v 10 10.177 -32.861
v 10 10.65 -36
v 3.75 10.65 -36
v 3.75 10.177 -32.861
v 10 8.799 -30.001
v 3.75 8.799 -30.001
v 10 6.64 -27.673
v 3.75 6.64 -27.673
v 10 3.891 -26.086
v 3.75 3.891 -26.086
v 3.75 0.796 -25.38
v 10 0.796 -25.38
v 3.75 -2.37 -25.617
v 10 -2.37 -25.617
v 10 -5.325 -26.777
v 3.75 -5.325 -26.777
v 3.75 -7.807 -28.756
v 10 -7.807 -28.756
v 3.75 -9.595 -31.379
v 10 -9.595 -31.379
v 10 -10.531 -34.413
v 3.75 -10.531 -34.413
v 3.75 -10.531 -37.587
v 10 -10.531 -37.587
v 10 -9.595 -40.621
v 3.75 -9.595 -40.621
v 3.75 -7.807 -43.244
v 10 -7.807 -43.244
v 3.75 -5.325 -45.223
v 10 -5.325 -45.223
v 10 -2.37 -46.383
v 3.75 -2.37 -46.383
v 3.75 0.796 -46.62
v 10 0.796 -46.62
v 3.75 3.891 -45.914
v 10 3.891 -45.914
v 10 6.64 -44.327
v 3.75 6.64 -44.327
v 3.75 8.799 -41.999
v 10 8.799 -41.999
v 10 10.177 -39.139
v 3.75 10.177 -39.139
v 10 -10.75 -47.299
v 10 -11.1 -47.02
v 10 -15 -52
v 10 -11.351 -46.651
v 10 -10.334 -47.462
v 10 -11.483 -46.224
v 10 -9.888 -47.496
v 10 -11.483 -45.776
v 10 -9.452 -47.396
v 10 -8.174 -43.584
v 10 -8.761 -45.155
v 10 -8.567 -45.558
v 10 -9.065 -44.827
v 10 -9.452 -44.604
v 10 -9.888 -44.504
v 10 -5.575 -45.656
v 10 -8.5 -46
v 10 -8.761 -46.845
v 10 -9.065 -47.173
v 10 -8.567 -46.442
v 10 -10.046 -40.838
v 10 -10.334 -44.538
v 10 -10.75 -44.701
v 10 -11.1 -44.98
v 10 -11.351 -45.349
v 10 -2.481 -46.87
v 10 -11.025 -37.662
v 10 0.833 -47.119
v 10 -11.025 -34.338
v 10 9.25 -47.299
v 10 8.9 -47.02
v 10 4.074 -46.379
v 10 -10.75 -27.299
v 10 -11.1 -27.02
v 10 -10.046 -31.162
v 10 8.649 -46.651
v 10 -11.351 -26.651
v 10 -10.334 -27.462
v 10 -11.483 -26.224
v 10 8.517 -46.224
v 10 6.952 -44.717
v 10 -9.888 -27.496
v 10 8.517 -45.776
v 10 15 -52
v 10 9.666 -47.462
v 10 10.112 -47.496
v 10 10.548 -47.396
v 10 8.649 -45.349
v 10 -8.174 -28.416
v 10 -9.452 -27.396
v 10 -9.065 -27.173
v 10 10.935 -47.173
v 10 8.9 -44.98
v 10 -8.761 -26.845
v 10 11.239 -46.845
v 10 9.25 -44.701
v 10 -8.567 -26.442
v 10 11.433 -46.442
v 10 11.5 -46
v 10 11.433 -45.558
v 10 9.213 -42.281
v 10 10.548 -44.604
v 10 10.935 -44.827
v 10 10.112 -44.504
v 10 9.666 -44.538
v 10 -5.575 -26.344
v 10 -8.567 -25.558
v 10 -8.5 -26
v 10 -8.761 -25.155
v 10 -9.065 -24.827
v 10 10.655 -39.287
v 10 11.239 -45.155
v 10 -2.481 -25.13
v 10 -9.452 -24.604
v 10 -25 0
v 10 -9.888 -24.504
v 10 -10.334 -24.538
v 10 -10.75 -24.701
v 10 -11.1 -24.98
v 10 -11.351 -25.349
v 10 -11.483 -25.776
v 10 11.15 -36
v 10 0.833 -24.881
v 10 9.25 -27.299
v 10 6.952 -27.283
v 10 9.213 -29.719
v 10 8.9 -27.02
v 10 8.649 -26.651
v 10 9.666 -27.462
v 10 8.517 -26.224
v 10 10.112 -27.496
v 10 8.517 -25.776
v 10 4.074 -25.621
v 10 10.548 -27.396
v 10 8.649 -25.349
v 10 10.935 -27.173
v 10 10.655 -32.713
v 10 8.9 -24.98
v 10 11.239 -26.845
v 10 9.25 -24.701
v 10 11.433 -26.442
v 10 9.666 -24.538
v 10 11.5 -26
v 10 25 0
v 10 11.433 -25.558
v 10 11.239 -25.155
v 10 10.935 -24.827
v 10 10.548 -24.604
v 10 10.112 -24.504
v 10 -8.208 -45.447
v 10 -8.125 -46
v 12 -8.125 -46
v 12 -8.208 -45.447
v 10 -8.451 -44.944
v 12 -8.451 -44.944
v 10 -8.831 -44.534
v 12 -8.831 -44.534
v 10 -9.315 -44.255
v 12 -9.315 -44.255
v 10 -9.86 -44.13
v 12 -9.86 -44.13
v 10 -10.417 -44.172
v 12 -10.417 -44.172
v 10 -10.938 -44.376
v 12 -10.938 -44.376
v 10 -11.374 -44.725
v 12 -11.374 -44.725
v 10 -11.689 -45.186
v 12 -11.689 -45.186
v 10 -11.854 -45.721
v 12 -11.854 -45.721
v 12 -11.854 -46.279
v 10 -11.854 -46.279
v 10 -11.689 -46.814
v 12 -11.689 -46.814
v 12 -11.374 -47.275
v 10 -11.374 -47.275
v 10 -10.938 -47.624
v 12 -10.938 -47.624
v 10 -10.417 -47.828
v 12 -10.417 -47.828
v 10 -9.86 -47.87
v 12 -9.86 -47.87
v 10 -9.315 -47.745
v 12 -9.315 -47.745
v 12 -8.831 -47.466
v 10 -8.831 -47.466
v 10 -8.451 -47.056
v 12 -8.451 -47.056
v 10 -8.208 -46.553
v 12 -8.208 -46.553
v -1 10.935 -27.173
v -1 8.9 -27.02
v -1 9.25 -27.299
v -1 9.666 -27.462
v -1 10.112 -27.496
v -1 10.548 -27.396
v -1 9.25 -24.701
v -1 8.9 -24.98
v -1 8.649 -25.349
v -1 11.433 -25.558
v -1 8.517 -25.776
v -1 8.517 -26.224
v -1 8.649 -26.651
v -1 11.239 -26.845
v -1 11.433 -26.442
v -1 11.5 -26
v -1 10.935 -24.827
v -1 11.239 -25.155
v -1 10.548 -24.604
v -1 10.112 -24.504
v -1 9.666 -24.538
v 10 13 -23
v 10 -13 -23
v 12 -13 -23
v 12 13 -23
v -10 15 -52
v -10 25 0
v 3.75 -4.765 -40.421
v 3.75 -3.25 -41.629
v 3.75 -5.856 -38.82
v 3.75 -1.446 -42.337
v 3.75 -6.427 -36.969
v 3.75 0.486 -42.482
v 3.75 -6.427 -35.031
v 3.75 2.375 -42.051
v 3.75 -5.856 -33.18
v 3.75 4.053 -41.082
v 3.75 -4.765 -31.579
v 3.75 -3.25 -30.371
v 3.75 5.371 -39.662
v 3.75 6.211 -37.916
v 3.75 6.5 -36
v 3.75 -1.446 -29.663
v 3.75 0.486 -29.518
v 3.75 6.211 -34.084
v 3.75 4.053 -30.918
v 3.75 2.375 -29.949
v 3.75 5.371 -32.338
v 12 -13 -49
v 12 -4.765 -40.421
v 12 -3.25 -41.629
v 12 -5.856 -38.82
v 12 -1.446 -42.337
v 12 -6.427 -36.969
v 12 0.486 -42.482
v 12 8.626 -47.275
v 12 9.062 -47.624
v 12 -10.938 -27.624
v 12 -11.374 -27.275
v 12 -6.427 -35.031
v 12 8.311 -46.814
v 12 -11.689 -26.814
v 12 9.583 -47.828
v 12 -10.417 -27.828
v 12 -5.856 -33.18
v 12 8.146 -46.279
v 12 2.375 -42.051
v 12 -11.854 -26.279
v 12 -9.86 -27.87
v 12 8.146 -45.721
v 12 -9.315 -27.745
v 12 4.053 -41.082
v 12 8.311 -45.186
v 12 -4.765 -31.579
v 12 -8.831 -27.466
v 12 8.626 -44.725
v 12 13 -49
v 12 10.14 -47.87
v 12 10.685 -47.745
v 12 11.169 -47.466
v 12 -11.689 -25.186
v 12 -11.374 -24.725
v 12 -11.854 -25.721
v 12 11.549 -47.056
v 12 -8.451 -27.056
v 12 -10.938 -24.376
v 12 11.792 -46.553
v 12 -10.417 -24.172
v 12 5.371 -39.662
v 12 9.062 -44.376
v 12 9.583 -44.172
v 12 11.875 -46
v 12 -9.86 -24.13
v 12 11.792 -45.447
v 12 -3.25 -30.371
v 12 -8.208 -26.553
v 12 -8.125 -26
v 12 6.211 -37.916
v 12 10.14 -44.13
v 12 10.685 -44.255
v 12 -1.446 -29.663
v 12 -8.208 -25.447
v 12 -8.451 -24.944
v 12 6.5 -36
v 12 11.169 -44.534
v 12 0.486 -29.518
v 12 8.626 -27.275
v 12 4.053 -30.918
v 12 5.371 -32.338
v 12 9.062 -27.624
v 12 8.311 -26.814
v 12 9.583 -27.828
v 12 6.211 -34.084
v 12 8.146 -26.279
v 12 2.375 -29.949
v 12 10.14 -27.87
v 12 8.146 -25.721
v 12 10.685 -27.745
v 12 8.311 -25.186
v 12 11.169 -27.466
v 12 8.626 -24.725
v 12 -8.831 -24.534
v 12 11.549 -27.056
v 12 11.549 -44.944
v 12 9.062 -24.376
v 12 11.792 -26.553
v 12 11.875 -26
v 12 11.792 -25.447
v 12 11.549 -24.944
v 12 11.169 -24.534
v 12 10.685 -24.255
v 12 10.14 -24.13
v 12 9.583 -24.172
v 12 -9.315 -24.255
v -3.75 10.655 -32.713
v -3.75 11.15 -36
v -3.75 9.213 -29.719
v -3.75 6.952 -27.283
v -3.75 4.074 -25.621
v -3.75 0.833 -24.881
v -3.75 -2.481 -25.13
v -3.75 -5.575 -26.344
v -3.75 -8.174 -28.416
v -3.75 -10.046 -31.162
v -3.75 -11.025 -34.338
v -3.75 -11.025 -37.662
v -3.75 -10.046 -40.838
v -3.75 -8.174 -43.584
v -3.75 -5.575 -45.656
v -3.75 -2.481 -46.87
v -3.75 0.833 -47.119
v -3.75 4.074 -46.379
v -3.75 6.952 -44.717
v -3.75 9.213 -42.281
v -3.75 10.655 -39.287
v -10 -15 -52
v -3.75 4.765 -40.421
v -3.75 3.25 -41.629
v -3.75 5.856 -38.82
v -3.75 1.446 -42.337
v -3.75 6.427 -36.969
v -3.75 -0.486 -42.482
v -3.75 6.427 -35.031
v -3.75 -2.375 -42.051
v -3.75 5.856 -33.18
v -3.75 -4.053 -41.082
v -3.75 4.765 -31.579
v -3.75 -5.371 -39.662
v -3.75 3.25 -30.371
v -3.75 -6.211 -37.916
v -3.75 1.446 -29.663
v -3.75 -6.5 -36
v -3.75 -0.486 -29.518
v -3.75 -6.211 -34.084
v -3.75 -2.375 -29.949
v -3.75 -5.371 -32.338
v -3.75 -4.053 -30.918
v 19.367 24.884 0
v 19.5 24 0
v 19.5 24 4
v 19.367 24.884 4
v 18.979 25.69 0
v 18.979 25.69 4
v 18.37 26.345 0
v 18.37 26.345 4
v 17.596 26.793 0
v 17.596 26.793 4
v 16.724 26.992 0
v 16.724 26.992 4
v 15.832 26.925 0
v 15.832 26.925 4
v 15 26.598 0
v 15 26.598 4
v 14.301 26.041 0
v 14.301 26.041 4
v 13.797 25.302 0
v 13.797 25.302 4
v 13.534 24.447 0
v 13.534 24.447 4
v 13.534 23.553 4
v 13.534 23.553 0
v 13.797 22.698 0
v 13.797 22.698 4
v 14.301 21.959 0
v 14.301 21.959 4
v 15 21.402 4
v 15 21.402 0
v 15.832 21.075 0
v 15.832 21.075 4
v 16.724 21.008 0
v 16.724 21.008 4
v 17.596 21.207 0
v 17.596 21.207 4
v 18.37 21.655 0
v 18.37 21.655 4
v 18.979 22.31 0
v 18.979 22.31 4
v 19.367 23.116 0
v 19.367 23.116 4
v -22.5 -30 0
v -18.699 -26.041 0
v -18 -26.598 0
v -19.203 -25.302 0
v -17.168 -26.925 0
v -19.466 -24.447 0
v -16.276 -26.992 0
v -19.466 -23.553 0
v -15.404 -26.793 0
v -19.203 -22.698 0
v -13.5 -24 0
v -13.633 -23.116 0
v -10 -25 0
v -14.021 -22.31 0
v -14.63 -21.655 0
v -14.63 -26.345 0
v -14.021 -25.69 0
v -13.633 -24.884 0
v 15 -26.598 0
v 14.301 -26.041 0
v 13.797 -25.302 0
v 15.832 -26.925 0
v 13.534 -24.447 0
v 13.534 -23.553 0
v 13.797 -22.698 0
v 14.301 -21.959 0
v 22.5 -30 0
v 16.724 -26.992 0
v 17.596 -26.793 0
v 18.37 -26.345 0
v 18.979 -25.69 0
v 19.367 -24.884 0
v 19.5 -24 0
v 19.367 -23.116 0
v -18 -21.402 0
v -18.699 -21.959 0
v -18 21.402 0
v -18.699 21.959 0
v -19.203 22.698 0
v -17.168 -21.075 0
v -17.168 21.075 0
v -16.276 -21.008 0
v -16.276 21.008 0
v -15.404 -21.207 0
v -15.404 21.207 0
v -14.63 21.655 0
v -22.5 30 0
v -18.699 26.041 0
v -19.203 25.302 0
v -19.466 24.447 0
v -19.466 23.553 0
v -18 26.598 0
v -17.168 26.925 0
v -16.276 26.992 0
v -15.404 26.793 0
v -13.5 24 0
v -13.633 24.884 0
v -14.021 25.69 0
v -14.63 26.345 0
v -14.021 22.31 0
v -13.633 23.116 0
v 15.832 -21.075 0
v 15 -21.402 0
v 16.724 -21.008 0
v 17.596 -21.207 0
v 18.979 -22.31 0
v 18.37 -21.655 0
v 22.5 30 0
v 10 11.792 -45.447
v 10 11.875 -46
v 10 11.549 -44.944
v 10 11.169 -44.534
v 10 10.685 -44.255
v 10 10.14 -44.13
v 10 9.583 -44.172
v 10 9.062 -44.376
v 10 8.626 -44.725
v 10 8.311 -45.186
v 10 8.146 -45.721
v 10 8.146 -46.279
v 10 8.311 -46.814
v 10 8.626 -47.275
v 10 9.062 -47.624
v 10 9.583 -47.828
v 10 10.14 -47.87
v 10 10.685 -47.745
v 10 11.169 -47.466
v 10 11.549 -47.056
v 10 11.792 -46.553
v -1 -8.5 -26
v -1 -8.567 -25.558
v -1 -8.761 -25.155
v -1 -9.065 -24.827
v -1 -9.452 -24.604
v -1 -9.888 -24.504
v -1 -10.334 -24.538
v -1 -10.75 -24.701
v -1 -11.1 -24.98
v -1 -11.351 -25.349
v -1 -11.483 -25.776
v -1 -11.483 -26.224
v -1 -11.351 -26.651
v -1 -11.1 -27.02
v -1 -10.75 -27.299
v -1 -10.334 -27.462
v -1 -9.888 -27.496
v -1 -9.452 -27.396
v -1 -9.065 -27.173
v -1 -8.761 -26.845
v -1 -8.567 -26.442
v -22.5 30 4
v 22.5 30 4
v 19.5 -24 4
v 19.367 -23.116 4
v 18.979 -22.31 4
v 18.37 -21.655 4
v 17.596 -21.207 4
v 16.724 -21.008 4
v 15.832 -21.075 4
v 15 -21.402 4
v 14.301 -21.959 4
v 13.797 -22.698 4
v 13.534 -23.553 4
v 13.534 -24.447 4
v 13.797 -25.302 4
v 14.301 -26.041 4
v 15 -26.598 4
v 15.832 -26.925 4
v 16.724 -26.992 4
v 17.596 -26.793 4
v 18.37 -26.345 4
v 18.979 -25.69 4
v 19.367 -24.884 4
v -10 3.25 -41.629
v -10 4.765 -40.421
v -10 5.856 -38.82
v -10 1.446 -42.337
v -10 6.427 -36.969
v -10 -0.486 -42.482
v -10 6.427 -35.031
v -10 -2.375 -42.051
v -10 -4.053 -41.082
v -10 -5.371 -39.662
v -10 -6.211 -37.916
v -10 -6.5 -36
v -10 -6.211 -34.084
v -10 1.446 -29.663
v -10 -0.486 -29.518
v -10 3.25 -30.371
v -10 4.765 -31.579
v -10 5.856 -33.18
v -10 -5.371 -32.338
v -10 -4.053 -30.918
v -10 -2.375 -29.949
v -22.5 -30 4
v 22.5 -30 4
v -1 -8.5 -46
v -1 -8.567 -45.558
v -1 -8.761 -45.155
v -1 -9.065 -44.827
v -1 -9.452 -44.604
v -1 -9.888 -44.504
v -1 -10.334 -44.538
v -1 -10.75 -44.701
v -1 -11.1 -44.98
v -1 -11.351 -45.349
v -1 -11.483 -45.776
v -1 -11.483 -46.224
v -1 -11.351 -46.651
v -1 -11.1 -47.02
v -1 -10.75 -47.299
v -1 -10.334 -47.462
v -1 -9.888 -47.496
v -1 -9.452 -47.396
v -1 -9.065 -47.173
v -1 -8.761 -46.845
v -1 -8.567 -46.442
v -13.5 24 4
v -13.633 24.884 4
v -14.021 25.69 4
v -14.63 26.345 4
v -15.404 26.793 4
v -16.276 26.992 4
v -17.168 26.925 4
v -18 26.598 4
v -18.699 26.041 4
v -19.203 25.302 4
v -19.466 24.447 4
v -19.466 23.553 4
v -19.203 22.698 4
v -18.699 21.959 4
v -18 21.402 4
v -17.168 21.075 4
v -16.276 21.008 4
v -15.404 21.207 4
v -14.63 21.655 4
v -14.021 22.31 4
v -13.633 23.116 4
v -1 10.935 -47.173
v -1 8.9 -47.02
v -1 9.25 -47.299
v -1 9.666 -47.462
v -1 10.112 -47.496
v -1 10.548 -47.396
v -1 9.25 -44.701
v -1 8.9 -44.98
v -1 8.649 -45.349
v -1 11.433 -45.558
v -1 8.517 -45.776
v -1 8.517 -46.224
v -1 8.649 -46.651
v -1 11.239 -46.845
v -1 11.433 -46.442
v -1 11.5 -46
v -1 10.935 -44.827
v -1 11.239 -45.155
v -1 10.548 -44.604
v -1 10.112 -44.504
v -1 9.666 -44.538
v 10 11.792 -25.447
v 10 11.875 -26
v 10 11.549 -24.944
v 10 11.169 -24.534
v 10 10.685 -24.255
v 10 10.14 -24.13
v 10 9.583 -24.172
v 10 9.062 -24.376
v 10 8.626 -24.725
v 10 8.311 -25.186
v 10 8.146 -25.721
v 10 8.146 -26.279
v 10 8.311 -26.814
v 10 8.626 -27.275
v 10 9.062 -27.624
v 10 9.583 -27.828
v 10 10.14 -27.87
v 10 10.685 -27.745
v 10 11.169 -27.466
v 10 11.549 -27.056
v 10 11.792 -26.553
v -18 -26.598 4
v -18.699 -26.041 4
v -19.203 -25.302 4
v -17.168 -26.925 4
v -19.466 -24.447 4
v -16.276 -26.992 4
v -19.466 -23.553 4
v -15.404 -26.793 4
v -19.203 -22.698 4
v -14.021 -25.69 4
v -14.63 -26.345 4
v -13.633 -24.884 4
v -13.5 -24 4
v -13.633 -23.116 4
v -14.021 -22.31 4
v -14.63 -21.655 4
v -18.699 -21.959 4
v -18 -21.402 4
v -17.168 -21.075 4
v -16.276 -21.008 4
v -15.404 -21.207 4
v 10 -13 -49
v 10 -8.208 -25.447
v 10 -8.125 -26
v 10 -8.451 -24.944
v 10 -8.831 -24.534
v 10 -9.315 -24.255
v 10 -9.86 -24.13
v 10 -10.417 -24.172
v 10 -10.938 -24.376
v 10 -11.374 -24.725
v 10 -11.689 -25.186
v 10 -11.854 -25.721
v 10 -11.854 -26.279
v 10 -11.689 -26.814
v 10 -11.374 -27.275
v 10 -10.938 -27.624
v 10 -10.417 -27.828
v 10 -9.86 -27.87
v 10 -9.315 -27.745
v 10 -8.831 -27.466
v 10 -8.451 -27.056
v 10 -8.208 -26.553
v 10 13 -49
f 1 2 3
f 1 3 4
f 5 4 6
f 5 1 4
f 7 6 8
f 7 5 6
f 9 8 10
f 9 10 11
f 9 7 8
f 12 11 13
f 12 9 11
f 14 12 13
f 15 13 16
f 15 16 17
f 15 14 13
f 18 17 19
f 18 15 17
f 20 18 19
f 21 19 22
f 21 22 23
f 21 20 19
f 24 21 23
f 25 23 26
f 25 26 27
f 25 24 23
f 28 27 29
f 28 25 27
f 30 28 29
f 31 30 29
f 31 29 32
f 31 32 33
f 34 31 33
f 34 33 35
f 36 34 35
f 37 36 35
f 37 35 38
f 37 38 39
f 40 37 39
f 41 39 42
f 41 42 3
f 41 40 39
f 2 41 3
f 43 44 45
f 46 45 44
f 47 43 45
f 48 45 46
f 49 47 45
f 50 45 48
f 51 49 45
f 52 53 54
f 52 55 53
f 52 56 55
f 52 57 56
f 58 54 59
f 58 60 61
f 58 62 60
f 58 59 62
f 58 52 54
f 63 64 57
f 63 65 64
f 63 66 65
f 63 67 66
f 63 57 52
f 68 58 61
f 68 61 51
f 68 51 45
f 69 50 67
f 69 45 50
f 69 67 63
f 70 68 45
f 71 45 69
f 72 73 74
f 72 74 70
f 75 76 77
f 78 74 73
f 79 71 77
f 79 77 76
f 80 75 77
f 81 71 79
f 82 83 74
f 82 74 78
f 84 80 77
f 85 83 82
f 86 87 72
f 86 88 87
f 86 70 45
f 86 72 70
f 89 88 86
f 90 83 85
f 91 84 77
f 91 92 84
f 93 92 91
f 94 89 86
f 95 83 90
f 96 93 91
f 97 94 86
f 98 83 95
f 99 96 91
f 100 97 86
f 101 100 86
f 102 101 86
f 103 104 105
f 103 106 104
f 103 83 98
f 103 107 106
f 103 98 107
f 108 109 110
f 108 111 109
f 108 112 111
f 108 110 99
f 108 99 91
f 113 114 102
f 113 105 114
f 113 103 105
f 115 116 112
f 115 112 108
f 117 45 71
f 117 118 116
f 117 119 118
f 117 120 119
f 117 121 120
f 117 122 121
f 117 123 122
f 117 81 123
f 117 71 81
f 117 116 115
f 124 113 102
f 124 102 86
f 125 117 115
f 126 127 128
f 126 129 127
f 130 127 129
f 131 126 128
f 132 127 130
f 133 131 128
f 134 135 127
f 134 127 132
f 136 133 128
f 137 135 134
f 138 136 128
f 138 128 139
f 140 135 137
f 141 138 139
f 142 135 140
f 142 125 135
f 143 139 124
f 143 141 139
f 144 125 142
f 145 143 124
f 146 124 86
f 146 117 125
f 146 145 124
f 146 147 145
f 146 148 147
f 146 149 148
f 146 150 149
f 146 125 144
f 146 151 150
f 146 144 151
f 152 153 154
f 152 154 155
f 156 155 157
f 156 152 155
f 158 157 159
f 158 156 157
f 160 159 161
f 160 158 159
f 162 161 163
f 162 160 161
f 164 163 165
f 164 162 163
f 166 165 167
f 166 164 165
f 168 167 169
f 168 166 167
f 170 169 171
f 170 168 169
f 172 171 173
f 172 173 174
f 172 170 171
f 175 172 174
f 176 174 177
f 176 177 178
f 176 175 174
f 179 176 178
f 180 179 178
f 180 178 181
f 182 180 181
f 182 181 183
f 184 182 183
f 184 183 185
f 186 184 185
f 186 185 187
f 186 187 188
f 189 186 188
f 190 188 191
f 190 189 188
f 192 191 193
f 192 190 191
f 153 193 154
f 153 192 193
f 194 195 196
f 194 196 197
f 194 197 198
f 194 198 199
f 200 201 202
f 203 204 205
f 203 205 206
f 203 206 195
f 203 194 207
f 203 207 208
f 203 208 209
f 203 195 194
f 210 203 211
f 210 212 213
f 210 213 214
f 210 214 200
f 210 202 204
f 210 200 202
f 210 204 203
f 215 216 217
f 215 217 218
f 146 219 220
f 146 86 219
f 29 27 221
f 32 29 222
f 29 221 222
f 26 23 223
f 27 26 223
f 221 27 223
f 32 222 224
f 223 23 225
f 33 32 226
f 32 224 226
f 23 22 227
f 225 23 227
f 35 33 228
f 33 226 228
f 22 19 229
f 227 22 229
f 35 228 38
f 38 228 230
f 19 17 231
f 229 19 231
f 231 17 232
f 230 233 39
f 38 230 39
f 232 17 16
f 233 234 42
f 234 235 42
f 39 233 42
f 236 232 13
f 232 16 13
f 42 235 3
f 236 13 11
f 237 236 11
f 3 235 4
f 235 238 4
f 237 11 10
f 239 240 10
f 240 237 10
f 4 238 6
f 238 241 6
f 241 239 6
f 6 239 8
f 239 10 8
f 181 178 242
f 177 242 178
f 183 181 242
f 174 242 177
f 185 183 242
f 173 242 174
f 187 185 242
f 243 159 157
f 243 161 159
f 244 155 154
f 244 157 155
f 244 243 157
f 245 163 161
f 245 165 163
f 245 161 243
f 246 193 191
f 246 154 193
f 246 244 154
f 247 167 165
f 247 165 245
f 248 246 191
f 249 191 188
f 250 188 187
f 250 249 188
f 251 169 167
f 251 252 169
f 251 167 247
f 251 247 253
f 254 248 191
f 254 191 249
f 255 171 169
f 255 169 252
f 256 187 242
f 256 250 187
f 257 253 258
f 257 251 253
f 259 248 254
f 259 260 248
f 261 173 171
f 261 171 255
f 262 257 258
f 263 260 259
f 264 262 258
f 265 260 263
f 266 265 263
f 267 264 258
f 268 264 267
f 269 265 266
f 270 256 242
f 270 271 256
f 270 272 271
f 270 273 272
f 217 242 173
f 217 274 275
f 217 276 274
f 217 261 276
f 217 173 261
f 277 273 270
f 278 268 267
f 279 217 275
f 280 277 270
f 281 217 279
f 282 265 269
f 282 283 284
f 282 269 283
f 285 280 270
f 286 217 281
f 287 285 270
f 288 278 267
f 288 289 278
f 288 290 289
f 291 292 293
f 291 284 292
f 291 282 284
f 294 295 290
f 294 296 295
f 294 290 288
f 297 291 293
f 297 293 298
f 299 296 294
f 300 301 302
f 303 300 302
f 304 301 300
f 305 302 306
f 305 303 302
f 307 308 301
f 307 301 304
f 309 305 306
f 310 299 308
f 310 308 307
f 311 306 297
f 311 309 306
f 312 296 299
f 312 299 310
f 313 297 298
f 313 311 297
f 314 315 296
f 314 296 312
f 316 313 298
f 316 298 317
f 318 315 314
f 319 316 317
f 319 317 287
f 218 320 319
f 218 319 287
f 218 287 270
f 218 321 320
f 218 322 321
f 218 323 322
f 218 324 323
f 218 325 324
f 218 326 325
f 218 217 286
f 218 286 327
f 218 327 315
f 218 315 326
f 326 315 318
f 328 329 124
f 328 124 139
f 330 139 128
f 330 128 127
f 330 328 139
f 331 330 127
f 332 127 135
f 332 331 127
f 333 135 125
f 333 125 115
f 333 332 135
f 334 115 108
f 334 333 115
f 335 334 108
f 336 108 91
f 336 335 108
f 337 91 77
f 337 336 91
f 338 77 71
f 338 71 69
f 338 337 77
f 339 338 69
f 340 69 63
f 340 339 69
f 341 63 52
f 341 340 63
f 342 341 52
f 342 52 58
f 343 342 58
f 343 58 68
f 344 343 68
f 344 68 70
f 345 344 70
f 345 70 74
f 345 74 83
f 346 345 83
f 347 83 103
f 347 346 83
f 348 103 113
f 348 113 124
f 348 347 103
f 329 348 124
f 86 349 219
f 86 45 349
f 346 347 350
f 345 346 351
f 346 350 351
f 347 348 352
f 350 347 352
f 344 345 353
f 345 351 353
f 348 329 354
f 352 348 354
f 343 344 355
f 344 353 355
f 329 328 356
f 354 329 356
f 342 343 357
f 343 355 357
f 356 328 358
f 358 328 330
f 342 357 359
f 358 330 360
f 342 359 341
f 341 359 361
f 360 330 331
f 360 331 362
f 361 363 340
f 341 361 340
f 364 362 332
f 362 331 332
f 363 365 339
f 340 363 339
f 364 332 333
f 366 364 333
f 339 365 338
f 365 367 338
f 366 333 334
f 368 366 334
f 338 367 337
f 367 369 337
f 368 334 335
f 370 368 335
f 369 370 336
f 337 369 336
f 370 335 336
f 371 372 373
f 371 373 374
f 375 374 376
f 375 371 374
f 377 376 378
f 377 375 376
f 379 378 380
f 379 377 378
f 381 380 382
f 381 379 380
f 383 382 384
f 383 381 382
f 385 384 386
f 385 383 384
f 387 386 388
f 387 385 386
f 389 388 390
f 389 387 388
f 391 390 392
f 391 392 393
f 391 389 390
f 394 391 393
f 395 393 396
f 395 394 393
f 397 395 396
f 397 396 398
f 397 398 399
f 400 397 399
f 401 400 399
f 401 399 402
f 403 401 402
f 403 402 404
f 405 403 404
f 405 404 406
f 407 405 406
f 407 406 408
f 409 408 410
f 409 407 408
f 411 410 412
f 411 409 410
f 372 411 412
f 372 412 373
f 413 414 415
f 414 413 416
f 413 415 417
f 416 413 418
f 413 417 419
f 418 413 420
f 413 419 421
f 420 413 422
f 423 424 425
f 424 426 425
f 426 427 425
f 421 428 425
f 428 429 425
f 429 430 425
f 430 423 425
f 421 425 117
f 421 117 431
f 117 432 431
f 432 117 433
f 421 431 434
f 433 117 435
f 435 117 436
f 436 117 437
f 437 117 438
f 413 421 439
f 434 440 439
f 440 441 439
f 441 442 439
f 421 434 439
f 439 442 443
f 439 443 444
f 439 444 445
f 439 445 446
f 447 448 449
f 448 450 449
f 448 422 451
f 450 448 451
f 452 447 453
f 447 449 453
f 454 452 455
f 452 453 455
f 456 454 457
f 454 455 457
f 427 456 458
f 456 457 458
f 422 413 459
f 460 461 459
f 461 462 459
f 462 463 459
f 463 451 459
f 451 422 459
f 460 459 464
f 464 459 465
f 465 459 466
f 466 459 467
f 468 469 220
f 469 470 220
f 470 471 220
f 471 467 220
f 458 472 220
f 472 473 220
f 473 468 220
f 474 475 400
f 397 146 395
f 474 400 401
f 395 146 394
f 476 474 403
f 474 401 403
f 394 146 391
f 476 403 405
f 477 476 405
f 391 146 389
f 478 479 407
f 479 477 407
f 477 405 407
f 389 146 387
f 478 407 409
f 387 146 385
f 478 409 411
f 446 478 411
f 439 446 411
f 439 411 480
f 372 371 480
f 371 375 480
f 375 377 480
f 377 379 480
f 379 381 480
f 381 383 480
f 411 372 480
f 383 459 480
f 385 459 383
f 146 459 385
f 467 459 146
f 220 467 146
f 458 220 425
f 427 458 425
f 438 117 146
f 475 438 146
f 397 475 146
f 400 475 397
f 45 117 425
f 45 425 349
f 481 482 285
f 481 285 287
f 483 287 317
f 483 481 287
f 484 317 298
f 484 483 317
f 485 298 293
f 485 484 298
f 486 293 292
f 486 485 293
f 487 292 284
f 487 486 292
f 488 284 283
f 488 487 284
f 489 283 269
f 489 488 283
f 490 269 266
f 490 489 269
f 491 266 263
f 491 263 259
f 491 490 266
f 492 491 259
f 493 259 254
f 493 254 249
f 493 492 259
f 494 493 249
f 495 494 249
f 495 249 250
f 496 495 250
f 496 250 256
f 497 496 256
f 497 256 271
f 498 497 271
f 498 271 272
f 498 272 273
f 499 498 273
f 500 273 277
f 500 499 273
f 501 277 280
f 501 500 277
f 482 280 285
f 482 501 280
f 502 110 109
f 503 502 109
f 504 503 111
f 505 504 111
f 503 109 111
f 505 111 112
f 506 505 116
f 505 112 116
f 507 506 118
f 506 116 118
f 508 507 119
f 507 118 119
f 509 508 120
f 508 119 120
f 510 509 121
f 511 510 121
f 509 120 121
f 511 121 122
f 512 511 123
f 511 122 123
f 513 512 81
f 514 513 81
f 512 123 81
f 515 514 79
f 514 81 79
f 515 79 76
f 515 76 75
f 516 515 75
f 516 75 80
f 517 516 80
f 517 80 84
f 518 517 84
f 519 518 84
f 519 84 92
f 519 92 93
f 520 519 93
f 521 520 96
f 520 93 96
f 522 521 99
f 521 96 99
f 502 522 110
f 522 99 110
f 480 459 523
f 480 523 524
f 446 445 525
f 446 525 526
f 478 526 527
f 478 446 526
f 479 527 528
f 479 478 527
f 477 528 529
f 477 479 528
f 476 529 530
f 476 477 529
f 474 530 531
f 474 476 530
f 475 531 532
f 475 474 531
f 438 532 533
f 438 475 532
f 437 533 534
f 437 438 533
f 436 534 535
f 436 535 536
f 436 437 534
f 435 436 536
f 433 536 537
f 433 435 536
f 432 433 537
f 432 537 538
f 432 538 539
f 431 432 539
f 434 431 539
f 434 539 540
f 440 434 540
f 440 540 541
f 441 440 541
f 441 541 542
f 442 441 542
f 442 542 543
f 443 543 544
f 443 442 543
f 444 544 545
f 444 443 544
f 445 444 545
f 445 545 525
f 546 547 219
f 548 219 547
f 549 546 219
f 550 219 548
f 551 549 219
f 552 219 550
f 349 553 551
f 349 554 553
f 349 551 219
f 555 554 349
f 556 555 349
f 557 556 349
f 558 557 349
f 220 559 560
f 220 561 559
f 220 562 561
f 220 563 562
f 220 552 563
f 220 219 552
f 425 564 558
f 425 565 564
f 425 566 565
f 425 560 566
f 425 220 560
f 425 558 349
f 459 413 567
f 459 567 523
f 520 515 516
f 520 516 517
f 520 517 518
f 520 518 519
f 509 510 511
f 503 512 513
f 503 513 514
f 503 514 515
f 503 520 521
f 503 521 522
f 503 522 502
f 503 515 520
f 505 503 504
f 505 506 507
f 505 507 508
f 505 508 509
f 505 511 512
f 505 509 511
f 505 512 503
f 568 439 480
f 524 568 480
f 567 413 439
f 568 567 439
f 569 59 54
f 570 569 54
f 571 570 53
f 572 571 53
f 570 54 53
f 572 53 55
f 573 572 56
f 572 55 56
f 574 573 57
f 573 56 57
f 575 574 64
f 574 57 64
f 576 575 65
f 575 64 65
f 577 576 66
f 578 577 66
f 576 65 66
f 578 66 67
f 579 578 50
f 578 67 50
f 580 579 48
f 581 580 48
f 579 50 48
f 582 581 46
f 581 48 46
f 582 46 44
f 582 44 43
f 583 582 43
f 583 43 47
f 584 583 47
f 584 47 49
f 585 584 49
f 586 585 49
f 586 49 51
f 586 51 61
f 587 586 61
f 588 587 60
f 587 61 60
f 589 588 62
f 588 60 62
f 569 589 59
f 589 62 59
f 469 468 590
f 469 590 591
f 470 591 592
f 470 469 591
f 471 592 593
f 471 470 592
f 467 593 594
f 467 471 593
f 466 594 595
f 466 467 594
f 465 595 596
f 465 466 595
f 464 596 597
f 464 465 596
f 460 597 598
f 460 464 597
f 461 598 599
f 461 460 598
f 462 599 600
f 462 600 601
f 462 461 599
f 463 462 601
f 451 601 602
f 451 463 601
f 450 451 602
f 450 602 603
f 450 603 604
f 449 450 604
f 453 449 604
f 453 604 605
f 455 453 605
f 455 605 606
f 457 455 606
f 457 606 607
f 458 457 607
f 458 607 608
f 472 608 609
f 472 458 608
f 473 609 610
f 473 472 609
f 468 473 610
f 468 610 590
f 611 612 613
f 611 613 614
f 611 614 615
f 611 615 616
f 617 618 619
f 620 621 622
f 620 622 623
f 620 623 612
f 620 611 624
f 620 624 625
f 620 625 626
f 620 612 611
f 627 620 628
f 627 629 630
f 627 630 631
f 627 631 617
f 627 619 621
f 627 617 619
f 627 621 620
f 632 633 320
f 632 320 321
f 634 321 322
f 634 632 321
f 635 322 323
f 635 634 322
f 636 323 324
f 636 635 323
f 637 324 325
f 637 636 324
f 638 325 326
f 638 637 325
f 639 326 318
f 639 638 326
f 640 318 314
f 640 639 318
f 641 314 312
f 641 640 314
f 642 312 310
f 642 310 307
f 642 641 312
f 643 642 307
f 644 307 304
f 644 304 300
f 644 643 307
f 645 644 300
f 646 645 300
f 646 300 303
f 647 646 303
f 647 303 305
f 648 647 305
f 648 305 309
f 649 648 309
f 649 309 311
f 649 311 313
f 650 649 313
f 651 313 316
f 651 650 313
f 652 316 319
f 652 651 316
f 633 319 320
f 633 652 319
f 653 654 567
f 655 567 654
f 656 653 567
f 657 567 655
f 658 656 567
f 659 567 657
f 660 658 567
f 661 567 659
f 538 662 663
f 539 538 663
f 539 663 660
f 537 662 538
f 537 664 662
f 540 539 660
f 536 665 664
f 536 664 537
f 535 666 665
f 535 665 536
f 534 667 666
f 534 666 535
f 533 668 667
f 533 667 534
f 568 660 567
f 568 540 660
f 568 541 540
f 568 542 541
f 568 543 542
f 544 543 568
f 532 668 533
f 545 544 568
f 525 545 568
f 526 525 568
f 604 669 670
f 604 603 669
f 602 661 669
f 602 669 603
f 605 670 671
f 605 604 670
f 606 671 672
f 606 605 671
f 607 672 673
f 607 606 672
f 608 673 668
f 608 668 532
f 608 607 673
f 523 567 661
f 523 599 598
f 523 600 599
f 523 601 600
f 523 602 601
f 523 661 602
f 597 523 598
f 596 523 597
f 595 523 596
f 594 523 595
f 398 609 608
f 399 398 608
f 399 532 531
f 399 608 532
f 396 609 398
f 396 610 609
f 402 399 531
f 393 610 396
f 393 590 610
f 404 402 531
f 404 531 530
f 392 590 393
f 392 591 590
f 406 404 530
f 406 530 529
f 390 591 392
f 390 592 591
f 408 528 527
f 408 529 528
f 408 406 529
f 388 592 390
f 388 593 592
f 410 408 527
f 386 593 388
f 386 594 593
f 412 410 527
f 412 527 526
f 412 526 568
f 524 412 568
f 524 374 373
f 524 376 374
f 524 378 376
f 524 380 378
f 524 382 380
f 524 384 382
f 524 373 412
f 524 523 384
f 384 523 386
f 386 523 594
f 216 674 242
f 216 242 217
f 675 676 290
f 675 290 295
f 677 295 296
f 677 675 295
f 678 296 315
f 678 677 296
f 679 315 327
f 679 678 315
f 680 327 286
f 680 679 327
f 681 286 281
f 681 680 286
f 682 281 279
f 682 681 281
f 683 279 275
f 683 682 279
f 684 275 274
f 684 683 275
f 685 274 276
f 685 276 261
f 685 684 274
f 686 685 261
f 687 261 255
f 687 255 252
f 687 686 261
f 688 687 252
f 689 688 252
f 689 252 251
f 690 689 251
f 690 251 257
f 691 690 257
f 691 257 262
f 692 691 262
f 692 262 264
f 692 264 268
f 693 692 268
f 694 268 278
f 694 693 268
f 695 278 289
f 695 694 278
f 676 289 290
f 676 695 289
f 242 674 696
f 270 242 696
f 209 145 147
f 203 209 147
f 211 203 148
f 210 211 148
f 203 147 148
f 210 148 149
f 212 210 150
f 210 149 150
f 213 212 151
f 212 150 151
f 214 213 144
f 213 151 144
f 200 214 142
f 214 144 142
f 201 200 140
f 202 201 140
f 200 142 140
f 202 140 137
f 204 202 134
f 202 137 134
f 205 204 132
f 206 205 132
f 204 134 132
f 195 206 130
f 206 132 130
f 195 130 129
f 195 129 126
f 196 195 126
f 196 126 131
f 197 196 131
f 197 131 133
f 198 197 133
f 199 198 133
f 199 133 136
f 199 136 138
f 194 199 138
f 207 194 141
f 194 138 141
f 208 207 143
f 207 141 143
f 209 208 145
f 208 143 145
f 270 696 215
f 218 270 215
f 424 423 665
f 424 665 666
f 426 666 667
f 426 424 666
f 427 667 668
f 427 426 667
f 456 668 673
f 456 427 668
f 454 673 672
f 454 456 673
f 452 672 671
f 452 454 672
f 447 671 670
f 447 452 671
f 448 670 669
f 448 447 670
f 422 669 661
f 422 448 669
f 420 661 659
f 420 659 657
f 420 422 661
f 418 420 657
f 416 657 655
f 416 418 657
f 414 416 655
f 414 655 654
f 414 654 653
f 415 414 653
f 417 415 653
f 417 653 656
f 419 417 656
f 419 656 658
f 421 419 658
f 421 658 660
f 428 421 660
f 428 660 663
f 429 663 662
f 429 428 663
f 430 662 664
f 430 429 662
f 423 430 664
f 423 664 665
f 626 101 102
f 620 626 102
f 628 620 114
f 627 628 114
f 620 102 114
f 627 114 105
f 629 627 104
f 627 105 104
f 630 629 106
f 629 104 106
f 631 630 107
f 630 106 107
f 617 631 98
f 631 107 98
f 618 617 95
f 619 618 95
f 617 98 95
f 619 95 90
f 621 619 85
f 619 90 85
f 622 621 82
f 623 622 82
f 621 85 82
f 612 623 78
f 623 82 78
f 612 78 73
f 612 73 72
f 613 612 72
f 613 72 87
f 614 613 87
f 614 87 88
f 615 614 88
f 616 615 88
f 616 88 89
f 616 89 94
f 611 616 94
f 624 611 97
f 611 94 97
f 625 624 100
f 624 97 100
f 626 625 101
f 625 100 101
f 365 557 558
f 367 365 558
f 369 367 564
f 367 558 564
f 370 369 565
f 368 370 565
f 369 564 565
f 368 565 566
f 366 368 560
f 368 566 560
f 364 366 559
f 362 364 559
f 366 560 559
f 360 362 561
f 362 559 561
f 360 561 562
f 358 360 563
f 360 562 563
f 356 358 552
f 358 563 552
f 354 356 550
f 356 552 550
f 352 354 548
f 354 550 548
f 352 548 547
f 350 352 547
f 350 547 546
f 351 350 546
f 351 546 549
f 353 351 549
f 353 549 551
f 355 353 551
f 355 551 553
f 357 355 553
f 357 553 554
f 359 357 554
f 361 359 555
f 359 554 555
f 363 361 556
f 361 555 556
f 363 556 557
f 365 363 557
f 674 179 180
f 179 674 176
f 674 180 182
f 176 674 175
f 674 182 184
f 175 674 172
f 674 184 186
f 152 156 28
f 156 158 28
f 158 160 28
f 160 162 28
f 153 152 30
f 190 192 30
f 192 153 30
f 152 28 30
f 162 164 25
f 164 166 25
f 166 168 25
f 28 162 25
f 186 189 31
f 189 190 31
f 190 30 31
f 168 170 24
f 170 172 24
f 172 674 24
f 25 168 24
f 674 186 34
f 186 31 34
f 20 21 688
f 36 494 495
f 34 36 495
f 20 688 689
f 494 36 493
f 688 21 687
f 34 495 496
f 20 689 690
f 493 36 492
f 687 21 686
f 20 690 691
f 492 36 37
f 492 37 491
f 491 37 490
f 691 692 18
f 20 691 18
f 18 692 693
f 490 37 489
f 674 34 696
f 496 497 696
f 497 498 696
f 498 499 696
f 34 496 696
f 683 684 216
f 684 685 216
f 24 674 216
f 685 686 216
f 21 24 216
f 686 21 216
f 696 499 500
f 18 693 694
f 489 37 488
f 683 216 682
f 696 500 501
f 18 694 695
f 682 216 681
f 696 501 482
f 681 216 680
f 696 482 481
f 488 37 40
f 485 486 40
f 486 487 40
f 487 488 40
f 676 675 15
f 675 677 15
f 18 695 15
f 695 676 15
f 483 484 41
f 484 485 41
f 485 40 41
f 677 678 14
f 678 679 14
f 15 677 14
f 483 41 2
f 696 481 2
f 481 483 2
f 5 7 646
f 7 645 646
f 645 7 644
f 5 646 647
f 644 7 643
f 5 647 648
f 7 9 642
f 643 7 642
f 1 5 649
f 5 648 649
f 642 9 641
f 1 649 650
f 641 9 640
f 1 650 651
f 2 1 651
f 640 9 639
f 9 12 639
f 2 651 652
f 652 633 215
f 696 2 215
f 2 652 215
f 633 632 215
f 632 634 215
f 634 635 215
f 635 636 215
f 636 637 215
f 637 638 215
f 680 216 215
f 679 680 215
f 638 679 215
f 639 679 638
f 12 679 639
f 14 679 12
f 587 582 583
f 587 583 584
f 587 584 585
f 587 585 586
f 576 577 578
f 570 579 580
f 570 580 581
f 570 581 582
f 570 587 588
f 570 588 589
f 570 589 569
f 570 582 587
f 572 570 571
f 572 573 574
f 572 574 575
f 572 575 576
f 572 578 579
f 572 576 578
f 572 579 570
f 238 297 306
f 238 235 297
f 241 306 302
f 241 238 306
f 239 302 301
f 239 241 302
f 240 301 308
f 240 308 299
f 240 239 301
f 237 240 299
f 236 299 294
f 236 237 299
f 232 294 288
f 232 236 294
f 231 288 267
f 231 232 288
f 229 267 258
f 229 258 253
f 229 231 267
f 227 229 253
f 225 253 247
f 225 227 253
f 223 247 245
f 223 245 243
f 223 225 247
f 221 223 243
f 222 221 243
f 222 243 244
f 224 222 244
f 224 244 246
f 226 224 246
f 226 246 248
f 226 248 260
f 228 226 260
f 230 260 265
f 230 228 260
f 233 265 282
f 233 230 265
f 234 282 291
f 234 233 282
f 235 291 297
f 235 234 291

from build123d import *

# Parameters (mm, degrees)
F0_W      = 45
F0_H      = 60
F0_R      = 3
F1_DEPTH  = 4
F2_R      = 11.15
F3_DEPTH  = 10
F4_R      = 11.15
F4_R_2    = 6.5
F5_DEPTH  = 6.25
F6_R      = 10.65
F6_R_2    = 6.5
F7_DEPTH  = 6.25
F6_W      = 26
F6_H      = 26
F6_R_3    = 1.875
F6_R_4    = 11.15
F8_DEPTH  = 2
F9_R      = 1.5
F10_DEPTH = 11


with BuildPart() as f1:
    # F0 (on Top) → F1 (new body)
    with BuildSketch(Plane.XY):
        Rectangle(F0_W, F0_H)
        with Locations((-16.5, -24)):
            Circle(F0_R, mode=Mode.SUBTRACT)
        with Locations((16.5, -24)):
            Circle(F0_R, mode=Mode.SUBTRACT)
        with Locations((-16.5, 24)):
            Circle(F0_R, mode=Mode.SUBTRACT)
        with Locations((16.5, 24)):
            Circle(F0_R, mode=Mode.SUBTRACT)
    extrude(amount=F1_DEPTH)

    # F2 (on Right) → F3 (join, symmetric)
    with BuildSketch(Plane.YZ):
        Polygon((15, -52), (25, 0), (-25, 0), (-15, -52), align=None)
        with Locations((0, -36)):
            Circle(F2_R, mode=Mode.SUBTRACT)
    extrude(amount=F3_DEPTH, both=True)

    # F4 (on face) → F5 (join)
    with BuildSketch(Plane(origin=(-10, 0, 0), x_dir=(0, -1, 0), z_dir=(-1, 0, 0))):
        with Locations((0, -36)):
            Circle(F4_R)
        with Locations((0, -36)):
            Circle(F4_R_2, mode=Mode.SUBTRACT)
    extrude(amount=-F5_DEPTH)

    # F9 (on face) → F10 (cut)
    with BuildSketch(Plane.YZ.offset(10)):
        with Locations((-10, -26)):
            Circle(F9_R)
        with Locations((10, -26)):
            Circle(F9_R)
        with Locations((10, -46)):
            Circle(F9_R)
        with Locations((-10, -46)):
            Circle(F9_R)
    extrude(amount=-F10_DEPTH, mode=Mode.SUBTRACT)


with BuildPart() as f7:
    # F6 (on face) → F7 (new body)
    with BuildSketch(Plane.YZ.offset(10)):
        with Locations((0, -36)):
            Circle(F6_R)
        with Locations((0, -36)):
            Circle(F6_R_2, mode=Mode.SUBTRACT)
    extrude(amount=-F7_DEPTH)

    # F6 (on face) → F8 (join)
    with BuildSketch(Plane.YZ.offset(10)):
        with Locations((0, -36)):
            Rectangle(F6_W, F6_H)
        with Locations((-10, -46)):
            Circle(F6_R_3, mode=Mode.SUBTRACT)
        with Locations((10, -46)):
            Circle(F6_R_3, mode=Mode.SUBTRACT)
        with Locations((0, -36)):
            Circle(F6_R_4, mode=Mode.SUBTRACT)
        with Locations((-10, -26)):
            Circle(F6_R_3, mode=Mode.SUBTRACT)
        with Locations((10, -26)):
            Circle(F6_R_3, mode=Mode.SUBTRACT)
        with Locations((0, -36)):
            Circle(F6_R_4)
        with Locations((0, -36)):
            Circle(F6_R, mode=Mode.SUBTRACT)
        with Locations((0, -36)):
            Circle(F6_R)
        with Locations((0, -36)):
            Circle(F6_R_2, mode=Mode.SUBTRACT)
    extrude(amount=F8_DEPTH)


solid = Compound([f1.part, f7.part])
